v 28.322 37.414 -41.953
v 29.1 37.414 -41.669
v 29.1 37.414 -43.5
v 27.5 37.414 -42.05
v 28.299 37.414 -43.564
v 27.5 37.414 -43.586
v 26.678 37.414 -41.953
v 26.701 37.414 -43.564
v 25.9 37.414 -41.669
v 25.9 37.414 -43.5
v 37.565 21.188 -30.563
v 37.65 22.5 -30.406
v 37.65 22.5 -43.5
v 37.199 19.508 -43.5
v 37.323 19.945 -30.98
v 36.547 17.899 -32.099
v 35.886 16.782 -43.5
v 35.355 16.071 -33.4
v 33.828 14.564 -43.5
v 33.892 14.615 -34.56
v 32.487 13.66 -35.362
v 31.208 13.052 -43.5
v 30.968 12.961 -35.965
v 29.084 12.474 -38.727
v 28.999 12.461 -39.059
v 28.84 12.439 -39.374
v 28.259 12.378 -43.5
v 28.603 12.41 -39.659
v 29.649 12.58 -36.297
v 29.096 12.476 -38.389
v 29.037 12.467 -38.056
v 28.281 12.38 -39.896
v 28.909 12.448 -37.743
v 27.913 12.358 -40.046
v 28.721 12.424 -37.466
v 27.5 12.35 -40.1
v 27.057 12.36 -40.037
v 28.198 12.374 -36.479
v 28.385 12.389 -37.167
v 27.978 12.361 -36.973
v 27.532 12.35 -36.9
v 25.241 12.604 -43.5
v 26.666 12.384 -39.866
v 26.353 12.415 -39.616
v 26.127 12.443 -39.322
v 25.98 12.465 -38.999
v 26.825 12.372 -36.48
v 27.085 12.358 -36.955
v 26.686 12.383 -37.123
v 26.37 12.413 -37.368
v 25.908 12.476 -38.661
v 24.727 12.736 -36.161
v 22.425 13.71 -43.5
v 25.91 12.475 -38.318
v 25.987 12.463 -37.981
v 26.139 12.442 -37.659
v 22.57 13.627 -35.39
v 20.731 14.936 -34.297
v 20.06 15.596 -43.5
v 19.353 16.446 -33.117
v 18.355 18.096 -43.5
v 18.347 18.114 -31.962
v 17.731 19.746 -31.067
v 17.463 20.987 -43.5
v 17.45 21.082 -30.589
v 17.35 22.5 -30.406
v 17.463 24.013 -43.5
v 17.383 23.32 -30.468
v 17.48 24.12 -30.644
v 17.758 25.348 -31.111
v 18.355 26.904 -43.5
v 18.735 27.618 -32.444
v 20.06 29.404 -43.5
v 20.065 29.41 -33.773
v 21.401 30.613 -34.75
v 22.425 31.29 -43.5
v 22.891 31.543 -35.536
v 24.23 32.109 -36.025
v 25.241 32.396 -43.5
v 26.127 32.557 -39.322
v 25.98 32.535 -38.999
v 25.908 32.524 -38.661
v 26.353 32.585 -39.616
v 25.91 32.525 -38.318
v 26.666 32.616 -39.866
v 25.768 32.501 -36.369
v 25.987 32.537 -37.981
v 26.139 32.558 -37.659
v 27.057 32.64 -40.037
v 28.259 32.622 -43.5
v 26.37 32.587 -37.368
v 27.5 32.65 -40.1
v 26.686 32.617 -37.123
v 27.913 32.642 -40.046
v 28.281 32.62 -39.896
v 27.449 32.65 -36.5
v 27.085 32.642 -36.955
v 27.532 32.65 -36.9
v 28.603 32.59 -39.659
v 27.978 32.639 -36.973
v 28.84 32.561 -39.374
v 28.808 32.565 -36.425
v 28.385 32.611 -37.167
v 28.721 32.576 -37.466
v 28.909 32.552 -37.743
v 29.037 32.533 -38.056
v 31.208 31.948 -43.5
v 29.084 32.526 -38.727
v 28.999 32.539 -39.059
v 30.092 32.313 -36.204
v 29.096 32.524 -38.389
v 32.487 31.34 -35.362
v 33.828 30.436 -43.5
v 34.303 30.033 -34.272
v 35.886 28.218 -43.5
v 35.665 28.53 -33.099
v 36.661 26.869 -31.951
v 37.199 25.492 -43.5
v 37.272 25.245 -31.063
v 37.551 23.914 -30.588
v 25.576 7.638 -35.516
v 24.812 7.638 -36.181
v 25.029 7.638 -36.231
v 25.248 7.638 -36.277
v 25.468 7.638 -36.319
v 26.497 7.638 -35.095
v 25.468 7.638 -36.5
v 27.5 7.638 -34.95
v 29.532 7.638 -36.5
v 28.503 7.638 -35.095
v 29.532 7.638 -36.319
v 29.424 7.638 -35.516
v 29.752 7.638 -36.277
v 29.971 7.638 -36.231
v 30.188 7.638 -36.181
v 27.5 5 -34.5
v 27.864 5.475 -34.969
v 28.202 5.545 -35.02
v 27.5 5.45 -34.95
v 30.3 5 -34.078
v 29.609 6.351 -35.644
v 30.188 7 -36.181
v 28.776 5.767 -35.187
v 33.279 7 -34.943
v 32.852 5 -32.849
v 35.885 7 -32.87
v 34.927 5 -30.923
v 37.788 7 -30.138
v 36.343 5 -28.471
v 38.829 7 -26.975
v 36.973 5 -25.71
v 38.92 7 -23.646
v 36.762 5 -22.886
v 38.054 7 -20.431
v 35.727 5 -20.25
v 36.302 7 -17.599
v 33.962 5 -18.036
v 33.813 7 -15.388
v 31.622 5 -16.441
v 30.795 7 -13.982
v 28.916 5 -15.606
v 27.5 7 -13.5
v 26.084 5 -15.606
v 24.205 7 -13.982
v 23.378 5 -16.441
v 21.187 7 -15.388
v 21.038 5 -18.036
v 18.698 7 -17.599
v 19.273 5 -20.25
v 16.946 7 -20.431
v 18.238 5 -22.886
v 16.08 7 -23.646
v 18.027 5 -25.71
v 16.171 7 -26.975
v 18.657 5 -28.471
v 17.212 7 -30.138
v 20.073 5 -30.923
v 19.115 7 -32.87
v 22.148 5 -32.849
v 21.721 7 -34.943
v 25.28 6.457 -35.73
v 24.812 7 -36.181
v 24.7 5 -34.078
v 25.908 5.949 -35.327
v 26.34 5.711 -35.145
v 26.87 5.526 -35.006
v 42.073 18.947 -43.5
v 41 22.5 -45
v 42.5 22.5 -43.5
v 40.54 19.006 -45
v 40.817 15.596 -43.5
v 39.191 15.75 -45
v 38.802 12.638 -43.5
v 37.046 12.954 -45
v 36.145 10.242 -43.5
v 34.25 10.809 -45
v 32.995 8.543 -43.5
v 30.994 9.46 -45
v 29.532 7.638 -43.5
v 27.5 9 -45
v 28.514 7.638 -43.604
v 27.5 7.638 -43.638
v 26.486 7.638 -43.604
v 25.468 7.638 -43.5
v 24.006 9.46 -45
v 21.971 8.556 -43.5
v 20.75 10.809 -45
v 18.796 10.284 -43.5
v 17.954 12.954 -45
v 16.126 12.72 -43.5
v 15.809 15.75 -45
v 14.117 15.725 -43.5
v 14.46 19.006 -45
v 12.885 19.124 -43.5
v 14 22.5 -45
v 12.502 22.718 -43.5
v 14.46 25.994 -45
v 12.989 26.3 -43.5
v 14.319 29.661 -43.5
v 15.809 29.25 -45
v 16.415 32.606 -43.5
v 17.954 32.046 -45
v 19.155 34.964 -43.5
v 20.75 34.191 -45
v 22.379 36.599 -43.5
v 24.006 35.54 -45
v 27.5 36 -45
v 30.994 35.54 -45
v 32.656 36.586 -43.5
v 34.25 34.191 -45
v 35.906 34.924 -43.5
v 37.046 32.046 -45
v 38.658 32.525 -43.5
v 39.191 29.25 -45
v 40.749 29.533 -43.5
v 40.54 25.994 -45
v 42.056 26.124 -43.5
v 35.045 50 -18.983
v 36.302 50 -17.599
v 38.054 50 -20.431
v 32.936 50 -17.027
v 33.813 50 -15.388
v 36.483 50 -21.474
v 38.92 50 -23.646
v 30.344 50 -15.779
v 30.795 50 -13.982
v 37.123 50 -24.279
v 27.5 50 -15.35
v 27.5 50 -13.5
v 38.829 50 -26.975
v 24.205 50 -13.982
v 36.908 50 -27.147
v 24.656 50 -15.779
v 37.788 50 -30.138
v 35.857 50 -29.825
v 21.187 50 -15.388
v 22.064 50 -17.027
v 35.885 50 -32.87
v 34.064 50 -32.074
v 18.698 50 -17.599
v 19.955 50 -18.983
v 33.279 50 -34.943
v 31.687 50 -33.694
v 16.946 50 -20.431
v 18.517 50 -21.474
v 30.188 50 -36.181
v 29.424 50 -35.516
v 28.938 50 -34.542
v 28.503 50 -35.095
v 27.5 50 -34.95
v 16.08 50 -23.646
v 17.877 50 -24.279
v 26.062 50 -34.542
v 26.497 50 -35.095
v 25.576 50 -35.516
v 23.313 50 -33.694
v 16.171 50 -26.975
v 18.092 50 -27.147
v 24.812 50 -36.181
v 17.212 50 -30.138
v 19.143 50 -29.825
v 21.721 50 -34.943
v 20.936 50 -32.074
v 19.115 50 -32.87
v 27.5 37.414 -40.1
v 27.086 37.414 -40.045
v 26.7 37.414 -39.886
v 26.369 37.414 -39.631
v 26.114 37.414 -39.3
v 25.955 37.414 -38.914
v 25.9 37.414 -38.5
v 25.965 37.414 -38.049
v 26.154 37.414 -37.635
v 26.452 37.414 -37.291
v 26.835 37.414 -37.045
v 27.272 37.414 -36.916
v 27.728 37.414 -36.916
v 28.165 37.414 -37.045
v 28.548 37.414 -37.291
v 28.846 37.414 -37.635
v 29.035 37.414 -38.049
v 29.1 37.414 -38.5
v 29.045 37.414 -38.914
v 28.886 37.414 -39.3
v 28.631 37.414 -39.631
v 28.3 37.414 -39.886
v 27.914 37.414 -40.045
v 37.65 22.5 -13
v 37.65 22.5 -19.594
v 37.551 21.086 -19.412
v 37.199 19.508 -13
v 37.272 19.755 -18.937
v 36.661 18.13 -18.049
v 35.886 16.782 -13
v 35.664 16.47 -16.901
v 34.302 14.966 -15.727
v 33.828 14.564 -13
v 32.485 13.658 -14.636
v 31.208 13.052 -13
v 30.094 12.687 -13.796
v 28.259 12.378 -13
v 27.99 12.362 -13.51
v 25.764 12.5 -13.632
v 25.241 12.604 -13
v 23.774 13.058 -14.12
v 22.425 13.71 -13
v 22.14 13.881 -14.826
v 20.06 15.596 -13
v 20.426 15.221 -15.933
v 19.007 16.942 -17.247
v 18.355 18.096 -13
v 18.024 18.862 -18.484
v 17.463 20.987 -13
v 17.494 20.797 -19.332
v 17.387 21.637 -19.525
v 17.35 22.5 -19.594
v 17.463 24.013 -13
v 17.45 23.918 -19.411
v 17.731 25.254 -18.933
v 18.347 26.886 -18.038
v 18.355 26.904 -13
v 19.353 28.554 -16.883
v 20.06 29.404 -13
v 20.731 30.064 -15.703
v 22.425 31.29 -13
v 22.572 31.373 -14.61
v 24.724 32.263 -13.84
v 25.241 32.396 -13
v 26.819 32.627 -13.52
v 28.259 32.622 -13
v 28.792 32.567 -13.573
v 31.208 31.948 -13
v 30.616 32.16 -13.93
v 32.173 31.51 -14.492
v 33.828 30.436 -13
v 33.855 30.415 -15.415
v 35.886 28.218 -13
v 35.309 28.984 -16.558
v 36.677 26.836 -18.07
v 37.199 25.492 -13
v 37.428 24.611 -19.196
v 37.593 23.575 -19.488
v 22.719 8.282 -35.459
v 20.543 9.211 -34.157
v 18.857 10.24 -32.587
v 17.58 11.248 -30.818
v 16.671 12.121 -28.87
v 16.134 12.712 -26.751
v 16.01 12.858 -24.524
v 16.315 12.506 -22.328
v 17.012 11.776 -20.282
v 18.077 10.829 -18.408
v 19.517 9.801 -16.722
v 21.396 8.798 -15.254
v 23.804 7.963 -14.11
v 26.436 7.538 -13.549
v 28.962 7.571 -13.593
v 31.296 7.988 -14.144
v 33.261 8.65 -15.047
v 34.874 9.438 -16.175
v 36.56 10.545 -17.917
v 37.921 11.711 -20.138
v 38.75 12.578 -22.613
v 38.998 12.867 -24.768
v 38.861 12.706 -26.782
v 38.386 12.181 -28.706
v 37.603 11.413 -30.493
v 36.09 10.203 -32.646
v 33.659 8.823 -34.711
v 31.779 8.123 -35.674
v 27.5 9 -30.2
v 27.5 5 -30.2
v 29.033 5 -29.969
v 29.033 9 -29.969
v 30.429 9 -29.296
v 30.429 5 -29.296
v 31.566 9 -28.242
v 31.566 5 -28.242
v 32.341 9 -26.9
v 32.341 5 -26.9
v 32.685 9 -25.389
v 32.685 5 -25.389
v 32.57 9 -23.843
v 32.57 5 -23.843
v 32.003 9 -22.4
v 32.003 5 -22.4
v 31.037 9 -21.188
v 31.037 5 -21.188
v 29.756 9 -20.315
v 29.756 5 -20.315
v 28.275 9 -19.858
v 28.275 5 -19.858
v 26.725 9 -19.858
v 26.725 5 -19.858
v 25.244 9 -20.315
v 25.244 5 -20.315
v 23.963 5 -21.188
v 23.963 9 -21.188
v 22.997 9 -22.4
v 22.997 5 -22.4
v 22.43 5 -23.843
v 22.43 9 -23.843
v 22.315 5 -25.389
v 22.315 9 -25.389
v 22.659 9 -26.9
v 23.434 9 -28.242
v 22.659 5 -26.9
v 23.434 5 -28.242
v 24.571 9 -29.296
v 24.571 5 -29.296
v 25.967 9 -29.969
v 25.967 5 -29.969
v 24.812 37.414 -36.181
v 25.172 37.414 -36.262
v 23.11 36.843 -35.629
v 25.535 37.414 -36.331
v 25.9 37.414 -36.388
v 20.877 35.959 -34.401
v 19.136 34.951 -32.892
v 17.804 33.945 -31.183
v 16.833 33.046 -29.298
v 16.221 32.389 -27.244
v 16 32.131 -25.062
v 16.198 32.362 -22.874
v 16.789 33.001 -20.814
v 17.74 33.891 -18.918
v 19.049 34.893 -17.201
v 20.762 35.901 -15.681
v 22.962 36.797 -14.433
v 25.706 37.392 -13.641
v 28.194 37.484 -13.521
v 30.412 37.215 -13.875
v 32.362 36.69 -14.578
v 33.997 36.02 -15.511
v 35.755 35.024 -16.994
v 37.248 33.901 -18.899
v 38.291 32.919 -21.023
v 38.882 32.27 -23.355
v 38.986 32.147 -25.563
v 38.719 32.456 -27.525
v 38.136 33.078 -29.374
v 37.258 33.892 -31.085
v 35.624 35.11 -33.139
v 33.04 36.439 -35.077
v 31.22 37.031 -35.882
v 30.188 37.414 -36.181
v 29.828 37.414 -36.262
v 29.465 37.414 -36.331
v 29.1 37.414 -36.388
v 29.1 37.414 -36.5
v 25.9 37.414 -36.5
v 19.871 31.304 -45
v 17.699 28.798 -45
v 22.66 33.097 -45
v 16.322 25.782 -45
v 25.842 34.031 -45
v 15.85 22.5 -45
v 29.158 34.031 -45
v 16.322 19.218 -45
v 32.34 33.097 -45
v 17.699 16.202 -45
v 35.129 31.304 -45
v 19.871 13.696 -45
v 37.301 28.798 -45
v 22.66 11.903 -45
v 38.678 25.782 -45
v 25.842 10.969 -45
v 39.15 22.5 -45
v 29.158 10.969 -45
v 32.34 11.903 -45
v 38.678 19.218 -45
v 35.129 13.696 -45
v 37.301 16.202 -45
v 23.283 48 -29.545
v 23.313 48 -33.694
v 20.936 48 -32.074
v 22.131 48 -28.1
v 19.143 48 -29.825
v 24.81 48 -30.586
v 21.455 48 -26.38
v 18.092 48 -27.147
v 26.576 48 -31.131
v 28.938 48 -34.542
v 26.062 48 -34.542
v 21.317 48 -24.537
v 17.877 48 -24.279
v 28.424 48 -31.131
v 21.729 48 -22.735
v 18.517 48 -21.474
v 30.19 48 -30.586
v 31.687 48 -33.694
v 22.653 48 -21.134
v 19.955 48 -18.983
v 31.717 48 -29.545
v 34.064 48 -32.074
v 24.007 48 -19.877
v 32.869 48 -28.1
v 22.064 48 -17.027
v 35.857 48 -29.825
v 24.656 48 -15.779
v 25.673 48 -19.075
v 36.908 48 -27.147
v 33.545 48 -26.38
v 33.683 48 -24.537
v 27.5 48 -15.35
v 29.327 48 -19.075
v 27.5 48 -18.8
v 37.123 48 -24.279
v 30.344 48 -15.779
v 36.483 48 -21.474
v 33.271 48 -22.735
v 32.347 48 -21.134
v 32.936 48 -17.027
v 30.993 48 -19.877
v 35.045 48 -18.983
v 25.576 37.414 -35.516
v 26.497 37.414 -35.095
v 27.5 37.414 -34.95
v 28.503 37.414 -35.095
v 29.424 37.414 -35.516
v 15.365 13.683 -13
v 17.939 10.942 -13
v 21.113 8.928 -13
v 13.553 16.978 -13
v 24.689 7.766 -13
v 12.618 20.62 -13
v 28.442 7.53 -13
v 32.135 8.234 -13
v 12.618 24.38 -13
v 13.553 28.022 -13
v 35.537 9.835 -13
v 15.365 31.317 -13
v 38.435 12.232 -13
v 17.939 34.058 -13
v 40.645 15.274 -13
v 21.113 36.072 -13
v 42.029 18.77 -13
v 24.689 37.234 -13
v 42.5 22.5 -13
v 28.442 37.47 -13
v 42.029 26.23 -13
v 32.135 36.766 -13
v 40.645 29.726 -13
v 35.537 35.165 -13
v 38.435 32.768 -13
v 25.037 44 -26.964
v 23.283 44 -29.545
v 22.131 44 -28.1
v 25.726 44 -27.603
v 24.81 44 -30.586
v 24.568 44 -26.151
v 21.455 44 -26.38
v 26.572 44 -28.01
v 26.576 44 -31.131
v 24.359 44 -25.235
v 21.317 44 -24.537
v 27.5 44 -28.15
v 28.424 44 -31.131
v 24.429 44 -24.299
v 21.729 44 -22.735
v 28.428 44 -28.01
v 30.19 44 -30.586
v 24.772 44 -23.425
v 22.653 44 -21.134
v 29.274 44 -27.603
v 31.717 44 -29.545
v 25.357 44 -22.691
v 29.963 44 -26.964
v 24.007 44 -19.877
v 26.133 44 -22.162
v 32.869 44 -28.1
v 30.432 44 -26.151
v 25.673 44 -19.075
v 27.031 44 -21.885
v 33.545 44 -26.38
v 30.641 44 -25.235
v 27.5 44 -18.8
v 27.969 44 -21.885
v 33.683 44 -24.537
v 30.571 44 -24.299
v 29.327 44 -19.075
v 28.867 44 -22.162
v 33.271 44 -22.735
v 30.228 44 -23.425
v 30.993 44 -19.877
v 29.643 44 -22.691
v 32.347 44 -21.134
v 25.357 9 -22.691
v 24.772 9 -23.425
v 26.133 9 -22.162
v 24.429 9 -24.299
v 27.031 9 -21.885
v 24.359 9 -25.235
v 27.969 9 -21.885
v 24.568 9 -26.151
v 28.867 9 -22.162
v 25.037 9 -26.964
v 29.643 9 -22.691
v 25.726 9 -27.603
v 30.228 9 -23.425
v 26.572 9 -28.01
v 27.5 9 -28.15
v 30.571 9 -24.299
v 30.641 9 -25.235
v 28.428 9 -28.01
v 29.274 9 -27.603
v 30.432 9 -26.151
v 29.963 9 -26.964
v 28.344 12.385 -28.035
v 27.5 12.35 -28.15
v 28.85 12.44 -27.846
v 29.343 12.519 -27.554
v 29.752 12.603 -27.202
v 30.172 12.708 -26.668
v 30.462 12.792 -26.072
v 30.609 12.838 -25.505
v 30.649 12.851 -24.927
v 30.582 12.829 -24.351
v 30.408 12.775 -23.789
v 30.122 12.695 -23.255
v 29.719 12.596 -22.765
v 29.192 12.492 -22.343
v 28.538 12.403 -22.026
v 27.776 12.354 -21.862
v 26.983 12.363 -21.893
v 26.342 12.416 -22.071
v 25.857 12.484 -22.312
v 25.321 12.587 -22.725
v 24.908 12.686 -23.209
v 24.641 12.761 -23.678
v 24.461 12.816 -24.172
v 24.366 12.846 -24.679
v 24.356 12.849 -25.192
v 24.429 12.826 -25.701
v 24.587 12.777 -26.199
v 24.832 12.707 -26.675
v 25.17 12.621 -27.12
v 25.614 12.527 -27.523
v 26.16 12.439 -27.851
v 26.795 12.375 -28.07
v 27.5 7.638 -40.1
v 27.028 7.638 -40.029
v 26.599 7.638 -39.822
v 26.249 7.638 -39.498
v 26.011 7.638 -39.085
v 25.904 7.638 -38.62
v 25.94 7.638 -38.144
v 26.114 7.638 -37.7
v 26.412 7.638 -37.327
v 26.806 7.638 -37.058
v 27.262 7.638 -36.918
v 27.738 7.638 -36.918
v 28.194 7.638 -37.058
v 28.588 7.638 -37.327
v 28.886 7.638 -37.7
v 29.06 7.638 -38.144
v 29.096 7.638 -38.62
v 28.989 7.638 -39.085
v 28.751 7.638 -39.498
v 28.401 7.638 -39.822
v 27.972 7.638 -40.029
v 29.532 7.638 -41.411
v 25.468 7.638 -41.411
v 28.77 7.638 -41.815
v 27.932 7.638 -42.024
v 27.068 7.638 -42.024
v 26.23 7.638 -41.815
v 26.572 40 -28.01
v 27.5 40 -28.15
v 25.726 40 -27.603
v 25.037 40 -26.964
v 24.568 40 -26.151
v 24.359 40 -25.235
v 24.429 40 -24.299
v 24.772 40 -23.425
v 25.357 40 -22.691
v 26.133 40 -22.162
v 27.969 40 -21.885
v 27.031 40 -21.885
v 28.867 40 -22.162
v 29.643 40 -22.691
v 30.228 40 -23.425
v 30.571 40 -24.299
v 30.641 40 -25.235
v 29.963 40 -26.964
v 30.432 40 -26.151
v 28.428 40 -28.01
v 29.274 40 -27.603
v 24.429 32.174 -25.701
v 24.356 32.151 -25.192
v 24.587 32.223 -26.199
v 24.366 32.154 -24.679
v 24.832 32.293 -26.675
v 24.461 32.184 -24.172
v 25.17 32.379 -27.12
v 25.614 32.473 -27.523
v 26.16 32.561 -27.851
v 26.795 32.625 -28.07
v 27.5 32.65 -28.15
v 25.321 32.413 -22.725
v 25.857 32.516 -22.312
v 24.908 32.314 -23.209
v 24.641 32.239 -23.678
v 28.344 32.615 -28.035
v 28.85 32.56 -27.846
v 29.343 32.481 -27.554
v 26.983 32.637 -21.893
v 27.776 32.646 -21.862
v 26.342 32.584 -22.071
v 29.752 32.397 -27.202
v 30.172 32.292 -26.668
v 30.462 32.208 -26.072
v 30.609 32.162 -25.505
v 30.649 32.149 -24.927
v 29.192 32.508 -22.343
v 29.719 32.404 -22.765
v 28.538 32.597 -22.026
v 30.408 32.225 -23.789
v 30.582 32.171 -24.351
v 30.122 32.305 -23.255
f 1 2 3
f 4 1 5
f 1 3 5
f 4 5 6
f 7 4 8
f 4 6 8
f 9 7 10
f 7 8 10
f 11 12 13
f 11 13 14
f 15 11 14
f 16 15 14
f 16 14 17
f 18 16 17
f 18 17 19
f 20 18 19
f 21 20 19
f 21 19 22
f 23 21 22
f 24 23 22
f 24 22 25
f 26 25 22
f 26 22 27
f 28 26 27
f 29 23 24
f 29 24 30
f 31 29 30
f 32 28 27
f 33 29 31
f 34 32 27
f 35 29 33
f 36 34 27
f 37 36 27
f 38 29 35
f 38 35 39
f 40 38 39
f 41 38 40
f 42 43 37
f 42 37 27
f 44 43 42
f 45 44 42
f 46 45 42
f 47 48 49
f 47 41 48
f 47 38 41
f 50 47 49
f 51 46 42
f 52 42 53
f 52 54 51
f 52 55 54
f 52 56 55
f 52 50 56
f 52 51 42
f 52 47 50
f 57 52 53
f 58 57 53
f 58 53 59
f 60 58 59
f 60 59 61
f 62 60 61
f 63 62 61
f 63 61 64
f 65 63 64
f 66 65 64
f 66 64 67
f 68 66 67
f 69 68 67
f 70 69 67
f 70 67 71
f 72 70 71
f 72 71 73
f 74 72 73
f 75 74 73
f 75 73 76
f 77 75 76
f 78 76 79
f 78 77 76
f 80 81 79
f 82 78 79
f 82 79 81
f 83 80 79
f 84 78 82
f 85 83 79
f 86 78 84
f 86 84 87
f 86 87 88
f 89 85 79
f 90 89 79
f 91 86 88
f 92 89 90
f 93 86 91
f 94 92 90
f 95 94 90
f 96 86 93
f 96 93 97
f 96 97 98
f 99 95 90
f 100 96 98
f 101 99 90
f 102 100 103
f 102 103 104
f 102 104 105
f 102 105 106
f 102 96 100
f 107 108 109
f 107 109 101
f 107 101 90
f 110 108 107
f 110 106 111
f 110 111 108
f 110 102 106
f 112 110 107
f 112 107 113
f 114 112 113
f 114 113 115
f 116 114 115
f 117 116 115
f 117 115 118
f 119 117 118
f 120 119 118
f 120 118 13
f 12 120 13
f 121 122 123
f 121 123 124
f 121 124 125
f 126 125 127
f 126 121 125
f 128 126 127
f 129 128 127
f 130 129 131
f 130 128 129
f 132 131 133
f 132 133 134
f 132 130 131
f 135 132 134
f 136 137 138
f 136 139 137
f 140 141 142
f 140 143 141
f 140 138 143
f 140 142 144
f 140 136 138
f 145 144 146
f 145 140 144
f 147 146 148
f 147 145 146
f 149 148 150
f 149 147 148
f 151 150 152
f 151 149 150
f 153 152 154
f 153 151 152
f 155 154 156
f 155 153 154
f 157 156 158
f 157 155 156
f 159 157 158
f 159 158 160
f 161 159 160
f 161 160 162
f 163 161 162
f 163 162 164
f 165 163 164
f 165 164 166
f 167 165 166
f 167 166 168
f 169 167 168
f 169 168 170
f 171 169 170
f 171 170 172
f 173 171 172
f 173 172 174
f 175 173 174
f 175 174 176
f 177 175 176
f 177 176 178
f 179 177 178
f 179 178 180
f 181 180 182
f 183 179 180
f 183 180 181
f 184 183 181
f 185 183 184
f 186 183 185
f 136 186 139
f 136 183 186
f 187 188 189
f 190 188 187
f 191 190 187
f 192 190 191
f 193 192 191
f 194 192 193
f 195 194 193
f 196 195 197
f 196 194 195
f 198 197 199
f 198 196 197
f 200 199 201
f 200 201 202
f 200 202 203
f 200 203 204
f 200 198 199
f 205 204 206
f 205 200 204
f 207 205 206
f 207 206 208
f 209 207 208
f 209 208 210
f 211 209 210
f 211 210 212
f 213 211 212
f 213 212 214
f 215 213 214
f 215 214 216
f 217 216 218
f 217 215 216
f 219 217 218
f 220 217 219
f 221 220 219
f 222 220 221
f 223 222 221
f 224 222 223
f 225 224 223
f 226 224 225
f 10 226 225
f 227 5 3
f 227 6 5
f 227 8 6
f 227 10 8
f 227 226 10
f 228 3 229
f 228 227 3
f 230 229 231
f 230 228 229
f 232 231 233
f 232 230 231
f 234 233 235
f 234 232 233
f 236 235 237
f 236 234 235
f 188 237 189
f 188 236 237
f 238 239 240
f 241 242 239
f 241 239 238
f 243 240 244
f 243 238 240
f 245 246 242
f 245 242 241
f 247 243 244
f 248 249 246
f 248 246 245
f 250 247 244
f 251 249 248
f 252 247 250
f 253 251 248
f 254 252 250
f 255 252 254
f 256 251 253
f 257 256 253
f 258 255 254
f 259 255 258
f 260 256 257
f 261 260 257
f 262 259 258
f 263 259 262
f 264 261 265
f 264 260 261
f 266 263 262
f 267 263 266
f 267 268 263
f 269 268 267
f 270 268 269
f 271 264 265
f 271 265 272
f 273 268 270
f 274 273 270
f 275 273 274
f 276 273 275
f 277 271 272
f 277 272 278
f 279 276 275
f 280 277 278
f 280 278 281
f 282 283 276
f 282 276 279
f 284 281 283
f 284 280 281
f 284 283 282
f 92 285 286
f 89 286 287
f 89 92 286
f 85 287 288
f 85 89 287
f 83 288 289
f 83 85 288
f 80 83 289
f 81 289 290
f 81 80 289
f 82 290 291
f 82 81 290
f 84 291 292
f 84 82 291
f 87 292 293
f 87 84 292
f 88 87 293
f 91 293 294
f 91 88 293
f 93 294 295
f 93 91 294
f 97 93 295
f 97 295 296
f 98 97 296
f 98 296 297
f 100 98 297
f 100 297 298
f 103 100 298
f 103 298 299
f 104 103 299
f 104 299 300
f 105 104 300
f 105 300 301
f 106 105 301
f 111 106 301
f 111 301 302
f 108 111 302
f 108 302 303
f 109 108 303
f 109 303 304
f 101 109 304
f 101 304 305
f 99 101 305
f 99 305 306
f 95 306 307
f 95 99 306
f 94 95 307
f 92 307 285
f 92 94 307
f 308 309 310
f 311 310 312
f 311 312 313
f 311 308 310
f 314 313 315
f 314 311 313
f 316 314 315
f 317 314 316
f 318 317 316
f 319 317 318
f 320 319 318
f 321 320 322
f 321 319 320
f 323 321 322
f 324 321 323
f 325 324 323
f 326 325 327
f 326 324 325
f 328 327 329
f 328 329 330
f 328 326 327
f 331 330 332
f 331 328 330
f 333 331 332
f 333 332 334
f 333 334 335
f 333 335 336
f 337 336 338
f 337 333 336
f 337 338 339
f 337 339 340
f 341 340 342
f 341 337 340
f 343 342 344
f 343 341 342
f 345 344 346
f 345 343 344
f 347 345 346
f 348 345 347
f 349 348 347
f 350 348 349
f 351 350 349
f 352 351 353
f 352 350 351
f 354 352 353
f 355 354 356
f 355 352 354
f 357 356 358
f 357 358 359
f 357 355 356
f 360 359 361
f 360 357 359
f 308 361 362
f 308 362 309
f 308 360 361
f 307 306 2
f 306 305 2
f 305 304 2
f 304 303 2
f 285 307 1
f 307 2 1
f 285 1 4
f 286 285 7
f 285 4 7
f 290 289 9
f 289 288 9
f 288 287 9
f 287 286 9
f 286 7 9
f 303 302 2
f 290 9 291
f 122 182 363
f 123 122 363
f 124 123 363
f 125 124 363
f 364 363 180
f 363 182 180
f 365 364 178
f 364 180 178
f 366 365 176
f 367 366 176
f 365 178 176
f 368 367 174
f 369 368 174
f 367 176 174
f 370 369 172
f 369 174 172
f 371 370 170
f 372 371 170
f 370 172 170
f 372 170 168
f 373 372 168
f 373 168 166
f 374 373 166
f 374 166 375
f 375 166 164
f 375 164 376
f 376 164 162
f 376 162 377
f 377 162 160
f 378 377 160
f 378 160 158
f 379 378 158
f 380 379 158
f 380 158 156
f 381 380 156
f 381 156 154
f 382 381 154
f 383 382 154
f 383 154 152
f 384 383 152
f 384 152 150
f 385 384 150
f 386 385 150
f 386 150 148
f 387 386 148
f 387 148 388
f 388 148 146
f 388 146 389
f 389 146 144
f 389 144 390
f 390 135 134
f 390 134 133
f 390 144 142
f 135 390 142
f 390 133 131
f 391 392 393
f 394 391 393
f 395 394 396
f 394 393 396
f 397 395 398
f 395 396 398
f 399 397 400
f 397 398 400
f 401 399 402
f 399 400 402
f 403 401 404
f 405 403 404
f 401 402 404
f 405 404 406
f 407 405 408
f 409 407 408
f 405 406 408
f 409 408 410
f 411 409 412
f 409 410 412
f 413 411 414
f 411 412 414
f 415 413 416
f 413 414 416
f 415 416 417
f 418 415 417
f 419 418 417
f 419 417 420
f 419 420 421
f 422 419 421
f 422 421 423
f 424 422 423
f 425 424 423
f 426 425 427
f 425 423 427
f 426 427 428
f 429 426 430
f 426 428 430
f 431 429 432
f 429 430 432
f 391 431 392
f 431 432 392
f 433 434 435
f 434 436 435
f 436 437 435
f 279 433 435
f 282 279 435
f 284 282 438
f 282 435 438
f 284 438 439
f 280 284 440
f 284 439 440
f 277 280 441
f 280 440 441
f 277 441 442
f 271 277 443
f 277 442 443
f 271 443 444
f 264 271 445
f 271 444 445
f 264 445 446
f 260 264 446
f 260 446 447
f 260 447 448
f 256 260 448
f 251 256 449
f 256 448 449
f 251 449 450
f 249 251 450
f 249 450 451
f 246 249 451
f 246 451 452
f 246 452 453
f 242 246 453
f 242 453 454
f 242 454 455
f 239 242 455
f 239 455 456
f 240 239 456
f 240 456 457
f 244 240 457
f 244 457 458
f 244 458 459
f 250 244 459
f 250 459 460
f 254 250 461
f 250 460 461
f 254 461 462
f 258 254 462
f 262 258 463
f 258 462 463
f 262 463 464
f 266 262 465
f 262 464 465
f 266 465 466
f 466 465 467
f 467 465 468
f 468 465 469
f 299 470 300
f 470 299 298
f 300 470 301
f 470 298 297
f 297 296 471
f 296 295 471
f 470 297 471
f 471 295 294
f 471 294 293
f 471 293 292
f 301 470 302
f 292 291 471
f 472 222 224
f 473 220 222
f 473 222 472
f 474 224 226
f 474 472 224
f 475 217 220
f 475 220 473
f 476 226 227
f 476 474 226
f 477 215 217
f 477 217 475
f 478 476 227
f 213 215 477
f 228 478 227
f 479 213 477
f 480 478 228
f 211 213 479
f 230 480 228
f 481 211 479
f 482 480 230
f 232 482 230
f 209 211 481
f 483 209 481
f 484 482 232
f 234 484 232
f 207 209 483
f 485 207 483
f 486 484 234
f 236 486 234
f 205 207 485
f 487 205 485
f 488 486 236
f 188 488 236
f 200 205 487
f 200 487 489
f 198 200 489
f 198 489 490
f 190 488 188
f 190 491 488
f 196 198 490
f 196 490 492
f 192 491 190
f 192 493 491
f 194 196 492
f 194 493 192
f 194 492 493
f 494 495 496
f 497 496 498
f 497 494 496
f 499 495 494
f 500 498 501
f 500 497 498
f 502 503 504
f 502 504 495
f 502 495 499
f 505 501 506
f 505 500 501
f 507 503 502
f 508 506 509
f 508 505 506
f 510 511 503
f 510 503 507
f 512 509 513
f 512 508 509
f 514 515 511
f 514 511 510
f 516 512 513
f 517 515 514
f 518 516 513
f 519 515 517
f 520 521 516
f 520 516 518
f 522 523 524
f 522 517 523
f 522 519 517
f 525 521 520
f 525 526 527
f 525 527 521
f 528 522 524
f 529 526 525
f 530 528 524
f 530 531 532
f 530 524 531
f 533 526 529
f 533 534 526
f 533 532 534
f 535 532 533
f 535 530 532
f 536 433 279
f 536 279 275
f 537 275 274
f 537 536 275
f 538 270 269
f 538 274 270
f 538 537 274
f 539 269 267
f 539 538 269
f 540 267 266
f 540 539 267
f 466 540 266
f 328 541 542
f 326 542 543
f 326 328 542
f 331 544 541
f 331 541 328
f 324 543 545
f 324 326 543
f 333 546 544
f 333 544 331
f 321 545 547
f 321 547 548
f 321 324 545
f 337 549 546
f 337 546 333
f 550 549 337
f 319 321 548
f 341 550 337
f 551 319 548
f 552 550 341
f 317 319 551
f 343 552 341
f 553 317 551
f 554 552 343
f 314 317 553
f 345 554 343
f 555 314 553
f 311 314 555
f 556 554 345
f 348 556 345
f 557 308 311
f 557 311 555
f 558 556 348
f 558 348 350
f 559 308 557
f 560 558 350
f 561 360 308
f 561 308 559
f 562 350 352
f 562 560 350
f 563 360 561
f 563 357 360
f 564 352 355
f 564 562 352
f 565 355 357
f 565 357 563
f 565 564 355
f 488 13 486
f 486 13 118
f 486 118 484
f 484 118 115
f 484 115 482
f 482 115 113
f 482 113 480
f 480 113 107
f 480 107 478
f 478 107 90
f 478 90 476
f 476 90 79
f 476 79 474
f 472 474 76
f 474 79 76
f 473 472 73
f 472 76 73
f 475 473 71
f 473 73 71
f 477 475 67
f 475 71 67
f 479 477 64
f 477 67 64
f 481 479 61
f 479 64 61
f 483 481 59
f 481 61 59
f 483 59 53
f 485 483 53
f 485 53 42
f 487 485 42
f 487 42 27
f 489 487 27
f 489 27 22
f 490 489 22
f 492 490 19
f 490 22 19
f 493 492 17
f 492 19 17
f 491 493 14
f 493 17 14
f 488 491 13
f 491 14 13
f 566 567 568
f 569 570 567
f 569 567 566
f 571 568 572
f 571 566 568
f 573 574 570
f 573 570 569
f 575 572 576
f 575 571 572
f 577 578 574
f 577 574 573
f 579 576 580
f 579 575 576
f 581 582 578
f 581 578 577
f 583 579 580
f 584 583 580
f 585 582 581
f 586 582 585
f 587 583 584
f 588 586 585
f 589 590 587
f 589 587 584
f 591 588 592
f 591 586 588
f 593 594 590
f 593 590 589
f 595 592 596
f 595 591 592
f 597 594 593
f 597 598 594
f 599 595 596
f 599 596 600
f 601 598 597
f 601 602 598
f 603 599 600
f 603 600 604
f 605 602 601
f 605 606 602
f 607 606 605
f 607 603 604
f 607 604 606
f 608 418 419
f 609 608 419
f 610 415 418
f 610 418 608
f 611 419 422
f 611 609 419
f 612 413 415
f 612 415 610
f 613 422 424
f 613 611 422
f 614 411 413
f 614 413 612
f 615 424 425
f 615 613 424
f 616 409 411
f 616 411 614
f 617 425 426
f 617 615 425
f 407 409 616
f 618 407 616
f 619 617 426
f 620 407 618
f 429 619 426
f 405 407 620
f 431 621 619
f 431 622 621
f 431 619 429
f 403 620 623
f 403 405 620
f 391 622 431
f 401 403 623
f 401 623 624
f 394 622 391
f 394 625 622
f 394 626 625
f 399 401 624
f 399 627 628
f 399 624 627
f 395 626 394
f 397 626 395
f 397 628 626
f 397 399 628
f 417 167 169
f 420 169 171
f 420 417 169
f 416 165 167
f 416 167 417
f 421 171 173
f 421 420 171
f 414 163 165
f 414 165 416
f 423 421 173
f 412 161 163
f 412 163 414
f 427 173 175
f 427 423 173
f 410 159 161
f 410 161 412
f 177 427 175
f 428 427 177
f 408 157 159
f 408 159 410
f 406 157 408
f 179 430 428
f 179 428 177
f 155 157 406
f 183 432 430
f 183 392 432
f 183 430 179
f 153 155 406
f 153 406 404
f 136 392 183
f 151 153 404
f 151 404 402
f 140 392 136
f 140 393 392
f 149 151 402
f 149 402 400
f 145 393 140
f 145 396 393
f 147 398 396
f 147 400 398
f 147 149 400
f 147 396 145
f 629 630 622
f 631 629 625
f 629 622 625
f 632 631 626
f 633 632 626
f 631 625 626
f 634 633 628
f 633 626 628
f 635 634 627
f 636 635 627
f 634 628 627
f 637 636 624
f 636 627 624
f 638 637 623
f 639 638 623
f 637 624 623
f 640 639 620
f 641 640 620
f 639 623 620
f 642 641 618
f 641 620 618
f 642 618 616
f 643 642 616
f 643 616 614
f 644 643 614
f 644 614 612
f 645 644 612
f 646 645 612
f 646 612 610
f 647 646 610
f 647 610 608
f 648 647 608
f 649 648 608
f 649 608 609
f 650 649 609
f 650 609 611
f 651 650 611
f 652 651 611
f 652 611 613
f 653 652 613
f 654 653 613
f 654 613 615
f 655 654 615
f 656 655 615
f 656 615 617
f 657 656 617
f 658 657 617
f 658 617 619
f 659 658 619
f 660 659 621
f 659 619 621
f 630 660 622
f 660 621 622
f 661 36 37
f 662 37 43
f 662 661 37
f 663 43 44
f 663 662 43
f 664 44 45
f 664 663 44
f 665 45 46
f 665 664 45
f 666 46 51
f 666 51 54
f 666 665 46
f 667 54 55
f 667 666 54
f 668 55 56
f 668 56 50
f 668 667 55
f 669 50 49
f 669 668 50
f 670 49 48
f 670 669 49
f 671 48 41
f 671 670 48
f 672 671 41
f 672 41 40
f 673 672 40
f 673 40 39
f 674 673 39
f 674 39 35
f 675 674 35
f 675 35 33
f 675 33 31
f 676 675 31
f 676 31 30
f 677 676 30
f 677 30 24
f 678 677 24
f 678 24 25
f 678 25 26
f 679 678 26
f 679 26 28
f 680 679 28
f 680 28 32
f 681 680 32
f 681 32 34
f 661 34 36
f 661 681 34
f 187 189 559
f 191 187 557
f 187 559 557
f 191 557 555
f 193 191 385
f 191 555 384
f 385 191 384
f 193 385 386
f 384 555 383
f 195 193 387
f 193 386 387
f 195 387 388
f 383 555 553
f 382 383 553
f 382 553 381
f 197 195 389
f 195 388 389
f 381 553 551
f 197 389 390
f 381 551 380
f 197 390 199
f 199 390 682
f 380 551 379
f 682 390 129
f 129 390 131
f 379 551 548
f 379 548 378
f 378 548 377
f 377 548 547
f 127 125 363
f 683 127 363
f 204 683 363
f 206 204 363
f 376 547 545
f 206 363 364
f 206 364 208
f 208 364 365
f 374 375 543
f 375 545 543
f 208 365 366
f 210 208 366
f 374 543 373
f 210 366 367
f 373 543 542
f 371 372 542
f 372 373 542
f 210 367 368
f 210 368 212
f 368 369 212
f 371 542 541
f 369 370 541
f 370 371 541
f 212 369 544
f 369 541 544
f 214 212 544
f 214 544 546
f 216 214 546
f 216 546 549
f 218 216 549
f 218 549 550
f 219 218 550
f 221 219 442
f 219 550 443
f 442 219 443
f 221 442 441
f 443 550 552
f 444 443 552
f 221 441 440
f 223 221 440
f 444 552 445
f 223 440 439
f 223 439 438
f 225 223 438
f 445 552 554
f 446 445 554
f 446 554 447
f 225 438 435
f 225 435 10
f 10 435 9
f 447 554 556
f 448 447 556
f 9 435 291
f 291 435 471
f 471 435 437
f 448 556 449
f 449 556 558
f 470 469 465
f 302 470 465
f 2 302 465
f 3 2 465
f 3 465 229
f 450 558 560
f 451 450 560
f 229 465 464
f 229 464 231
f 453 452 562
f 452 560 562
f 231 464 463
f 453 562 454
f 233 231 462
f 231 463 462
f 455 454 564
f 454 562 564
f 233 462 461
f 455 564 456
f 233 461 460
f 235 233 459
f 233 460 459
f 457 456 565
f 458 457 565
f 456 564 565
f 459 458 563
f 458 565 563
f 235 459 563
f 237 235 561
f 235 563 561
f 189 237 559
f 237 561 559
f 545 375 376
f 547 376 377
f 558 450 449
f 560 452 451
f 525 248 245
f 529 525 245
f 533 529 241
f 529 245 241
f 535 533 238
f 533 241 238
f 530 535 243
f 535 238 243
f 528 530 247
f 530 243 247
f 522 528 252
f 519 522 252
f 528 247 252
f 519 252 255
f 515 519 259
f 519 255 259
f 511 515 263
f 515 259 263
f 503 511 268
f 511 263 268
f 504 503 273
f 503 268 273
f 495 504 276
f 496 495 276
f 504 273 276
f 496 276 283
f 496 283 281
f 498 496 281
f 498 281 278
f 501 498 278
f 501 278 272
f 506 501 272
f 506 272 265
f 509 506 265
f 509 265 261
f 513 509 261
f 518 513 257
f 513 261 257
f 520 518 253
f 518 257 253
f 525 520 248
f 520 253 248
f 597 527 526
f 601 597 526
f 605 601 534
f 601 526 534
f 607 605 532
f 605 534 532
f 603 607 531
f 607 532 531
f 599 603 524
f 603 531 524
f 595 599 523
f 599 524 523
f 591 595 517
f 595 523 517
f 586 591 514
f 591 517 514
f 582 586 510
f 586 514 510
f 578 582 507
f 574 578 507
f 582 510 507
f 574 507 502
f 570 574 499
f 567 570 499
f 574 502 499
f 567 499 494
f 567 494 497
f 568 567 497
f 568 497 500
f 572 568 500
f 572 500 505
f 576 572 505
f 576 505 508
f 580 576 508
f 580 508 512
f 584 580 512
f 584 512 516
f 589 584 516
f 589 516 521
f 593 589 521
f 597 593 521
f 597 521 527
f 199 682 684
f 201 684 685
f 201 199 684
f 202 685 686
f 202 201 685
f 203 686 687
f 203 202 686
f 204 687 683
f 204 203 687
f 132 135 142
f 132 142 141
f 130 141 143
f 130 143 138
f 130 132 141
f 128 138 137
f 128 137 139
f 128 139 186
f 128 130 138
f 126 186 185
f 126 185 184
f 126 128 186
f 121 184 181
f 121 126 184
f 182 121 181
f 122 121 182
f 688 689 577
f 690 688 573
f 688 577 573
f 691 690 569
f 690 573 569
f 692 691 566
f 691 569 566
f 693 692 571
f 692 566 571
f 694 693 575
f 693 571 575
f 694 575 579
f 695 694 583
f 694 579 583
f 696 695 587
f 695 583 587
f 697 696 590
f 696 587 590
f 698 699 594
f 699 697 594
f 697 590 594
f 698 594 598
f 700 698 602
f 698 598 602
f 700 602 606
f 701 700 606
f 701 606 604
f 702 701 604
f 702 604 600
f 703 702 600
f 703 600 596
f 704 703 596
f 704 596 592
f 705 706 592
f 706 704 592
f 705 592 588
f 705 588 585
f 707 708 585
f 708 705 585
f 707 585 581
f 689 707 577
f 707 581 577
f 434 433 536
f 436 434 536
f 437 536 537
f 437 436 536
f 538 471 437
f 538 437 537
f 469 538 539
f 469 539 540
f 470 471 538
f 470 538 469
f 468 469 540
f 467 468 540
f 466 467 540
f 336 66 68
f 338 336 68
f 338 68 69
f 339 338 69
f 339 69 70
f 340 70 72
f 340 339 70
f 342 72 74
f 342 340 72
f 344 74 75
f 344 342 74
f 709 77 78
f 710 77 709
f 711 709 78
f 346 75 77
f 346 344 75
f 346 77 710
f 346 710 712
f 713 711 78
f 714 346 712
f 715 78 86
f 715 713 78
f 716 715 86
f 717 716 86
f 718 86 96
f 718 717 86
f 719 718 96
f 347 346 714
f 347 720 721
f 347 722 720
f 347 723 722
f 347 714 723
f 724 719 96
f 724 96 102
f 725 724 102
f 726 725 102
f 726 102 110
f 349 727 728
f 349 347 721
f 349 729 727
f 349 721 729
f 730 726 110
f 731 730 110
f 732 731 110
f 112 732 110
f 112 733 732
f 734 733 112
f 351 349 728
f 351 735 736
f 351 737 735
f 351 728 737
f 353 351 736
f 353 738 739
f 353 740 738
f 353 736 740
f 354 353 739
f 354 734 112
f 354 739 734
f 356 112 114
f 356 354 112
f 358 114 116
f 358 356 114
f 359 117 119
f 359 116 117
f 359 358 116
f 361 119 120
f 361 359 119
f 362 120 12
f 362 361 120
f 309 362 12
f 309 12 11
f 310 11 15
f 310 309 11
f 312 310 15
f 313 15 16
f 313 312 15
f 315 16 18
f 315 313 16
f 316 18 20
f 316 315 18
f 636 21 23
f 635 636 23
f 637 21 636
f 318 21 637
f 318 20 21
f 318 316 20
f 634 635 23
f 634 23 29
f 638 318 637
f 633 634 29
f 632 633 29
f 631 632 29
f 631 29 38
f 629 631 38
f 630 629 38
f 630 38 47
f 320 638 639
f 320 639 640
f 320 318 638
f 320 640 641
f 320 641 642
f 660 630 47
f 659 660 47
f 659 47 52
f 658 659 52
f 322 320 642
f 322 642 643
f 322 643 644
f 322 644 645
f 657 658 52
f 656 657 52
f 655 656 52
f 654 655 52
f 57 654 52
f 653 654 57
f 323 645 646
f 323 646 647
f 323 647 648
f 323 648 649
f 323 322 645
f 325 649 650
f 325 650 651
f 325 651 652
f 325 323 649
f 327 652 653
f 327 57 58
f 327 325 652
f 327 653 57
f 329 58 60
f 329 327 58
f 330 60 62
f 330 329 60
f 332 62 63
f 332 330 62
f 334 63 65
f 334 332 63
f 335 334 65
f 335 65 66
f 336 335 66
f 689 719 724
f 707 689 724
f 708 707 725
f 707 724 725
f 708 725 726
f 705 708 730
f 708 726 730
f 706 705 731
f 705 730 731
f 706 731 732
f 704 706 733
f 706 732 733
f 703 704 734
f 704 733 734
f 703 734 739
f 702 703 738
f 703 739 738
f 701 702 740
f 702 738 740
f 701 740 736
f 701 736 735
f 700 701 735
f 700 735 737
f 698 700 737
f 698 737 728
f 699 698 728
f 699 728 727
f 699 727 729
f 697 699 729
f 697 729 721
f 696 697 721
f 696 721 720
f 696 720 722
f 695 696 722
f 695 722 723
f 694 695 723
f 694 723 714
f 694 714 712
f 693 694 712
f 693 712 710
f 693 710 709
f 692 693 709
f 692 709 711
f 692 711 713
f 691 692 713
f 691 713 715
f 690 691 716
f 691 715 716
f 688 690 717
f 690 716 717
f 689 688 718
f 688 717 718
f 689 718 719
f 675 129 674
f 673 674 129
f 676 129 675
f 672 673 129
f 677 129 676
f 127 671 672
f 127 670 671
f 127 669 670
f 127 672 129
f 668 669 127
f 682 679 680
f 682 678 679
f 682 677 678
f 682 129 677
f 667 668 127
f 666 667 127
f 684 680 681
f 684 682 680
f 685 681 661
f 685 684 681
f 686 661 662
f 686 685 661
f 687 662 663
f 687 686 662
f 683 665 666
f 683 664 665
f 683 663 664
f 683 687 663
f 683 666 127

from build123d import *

# Parameters (mm, degrees)
EXTRUDE_1_DEPTH      = 45
SKETCH_5_R           = 7.9
EXTRUDE_3_DEPTH      = 45
CHAMFER_5_SIZE       = 8
CHAMFER_6_SIZE       = 2
FILLET_5_R           = 3
FILLET_6_R           = 2
SKETCH_7_R           = 15
SKETCH_7_R_2         = 10.15
EXTRUDE_4_DEPTH      = 45
SKETCH_6_R           = 1.6
SKETCH_6_R_2         = 3.1
CUT_EXTRUDE_4_DEPTH  = 85.113019206
SKETCH_10_R          = 11.5
EXTRUDE_5_DEPTH      = 50
FILLET_9_R           = 5
CUT_EXTRUDE_START    = -40
SKETCH_11_R          = 10.15
SKETCH_11_R_2        = 7.9
CUT_EXTRUDE_6_DEPTH  = 40
SKETCH_12_R          = 3.15
CUT_EXTRUDE_7_DEPTH  = 40
CHAMFER_9_SIZE       = 1.5
SKETCH_13_R          = 6.2
CUT_EXTRUDE_8_DEPTH  = 6
SKETCH_19_R          = 36.592880448
CUT_EXTRUDE_12_DEPTH = 87.890736042
SKETCH_20_R          = 20
CUT_EXTRUDE_13_DEPTH = 13
SKETCH_21_R          = 7.9
CUT_EXTRUDE_14_DEPTH = 74.008561269
SKETCH_22_W          = 4.064984698
SKETCH_22_H          = 0.276677518
SKETCH_22_W_2        = 3.2
SKETCH_22_H_2        = 0.1711549
CUT_EXTRUDE_15_DEPTH = 8.5
SKETCH_15_R          = 11.5
CUT_EXTRUDE_16_DEPTH = 5
SKETCH_23_R          = 5.2
CUT_EXTRUDE_17_DEPTH = 4
CHAMFER_10_SIZE      = 2
SKETCH_24_R          = 3.15
CUT_EXTRUDE_18_DEPTH = 74.159073316
SKETCH_25_R          = 9.65
CUT_EXTRUDE_19_DEPTH = 2
SKETCH_26_R          = 3.55
CUT_EXTRUDE_20_DEPTH = 14
SKETCH_27_R          = 3.55
CUT_EXTRUDE_21_DEPTH = 5


with BuildPart() as part:
    # 草图1 → 凸台-拉伸1 (new body)
    with BuildSketch(Plane(origin=(0, 0, 0), x_dir=(1, 0, 0), z_dir=(0, 1, 0))):
        with BuildLine():
            Line((0, 0), (55, 0))
            Line((55, 0), (55, -7))
            ThreePointArc((55, -7), (27.5, -34.5), (0, -7))
            Line((0, -7), (0, 0))
        make_face()
    extrude(amount=EXTRUDE_1_DEPTH)

    # 草图5 → 凸台-拉伸3 (add)
    with BuildSketch(Plane(origin=(0, 0, 0), x_dir=(-1, 0, 0), z_dir=(0, 0, -1))):
        with Locations((-27.5, 22.5)):
            Circle(SKETCH_5_R)
    extrude(amount=EXTRUDE_3_DEPTH)

    # 倒角5
    chamfer_5_edges = [part.edges().sort_by_distance(p)[0] for p in [
        (0, 45, 3.5),
        (55, 45, 3.5),
        (27.5, 45, 34.5),
        (0, 0, 3.5),
        (55, 0, 3.5),
        (27.5, 0, 34.5),
    ]]
    chamfer(chamfer_5_edges, length=CHAMFER_5_SIZE)

    # 倒角6
    chamfer_6_edges = [part.edges().sort_by_distance(p)[0] for p in [
        (4, 4, 0),
        (27.5, 0, 0),
        (51, 4, 0),
        (55, 22.5, 0),
        (51, 41, 0),
        (27.5, 45, 0),
        (4, 41, 0),
        (0, 22.5, 0),
    ]]
    chamfer(chamfer_6_edges, length=CHAMFER_6_SIZE)

    # 圆角5
    fillet_5_edges = [part.edges().sort_by_distance(p)[0] for p in [
        (35.4, 22.5, -45),
    ]]
    fillet(fillet_5_edges, radius=FILLET_5_R)

    # 圆角6
    fillet_6_edges = [part.edges().sort_by_distance(p)[0] for p in [
        (35.4, 22.5, 0),
    ]]
    fillet(fillet_6_edges, radius=FILLET_6_R)

    # 草图7 → 凸台-拉伸4 (add)
    with BuildSketch(Plane(origin=(0, 0, 0), x_dir=(-1, 0, 0), z_dir=(0, 0, -1))):
        with Locations((-27.5, 22.5)):
            Circle(SKETCH_7_R)
        with Locations((-27.5, 22.5)):
            Circle(SKETCH_7_R_2, mode=Mode.SUBTRACT)
    extrude(amount=EXTRUDE_4_DEPTH)

    # 草图6 → 切除-拉伸4 (cut, through all)
    with BuildSketch(Plane(origin=(0, 0, 0), x_dir=(1, 0, 0), z_dir=(0, 1, 0))):
        with Locations((27.5, 8.5)):
            Circle(SKETCH_6_R)
        with Locations((27.5, 25)):
            Circle(SKETCH_6_R_2)
        with Locations((27.5, 38.5)):
            Circle(SKETCH_6_R)
    extrude(amount=CUT_EXTRUDE_4_DEPTH, mode=Mode.SUBTRACT)

    # 草图10 → 凸台-拉伸5 (add)
    with BuildSketch(Plane(origin=(0, 0, 0), x_dir=(1, 0, 0), z_dir=(0, 1, 0))):
        with Locations((27.5, 25)):
            Circle(SKETCH_10_R)
    extrude(amount=EXTRUDE_5_DEPTH)

    # 圆角9
    fillet_9_edges = [part.edges().sort_by_distance(p)[0] for p in [
        (42.5, 22.5, 0),
    ]]
    fillet(fillet_9_edges, radius=FILLET_9_R)

    # 草图11 → 切除-拉伸6 (cut)
    with BuildSketch(Plane(origin=(0, 0, -45), x_dir=(-1, 0, 0), z_dir=(0, 0, -1)).offset(CUT_EXTRUDE_START)):
        with Locations((-27.5, 22.5)):
            Circle(SKETCH_11_R)
        with Locations((-27.5, 22.5)):
            Circle(SKETCH_11_R_2, mode=Mode.SUBTRACT)
    extrude(amount=CUT_EXTRUDE_6_DEPTH, mode=Mode.SUBTRACT)

    # 草图12 → 切除-拉伸7 (cut)
    with BuildSketch(Plane.XZ):
        with Locations((27.5, -25)):
            Circle(SKETCH_12_R)
    extrude(amount=-CUT_EXTRUDE_7_DEPTH, mode=Mode.SUBTRACT)

    # 倒角9
    chamfer_9_edges = [part.edges().sort_by_distance(p)[0] for p in [
        (37.65, 22.5, -45),
        (42.5, 22.5, -45),
    ]]
    chamfer(chamfer_9_edges, length=CHAMFER_9_SIZE)

    # 草图13 → 切除-拉伸8 (cut)
    with BuildSketch(Plane(origin=(0, 50, 0), x_dir=(1, 0, 0), z_dir=(0, 1, 0))):
        with Locations((27.5, 25)):
            Circle(SKETCH_13_R)
    extrude(amount=-CUT_EXTRUDE_8_DEPTH, mode=Mode.SUBTRACT)

    # 草图19 → 切除-拉伸12 (cut, through all)
    with BuildSketch(Plane(origin=(0, 0, 0), x_dir=(-1, 0, 0), z_dir=(0, 0, -1))):
        with Locations((-27.5, 22.5)):
            Circle(SKETCH_19_R)
    extrude(amount=-CUT_EXTRUDE_12_DEPTH, mode=Mode.SUBTRACT)


with BuildPart() as cut_extrude_12_piece_1:
    # of the separate pieces the step leaves, piece 1, a body of its own (cut_extrude_12_pieces)
    add(part.part.solids().sort_by_distance((12.5, 22.5, -43.5))[0])


with BuildPart() as cut_extrude_12_piece_2:
    # of the separate pieces the step leaves, piece 2, a body of its own (cut_extrude_12_pieces)
    add(part.part.solids().sort_by_distance((19.6, 22.5, -2))[0])


with BuildPart() as cut_extrude_13_tool:
    # 草图20 → 切除-拉伸13 (new body)
    with BuildSketch(Plane.XY):
        with Locations((27.5, 22.5)):
            Circle(SKETCH_20_R)
    extrude(amount=-CUT_EXTRUDE_13_DEPTH)


with BuildPart() as cut_extrude_12_piece_1_1:
    add(cut_extrude_12_piece_1.part)

    # 切除-拉伸13: cut by cut_extrude_13_tool
    add(cut_extrude_13_tool.part, mode=Mode.SUBTRACT)

    # 草图22 → 切除-拉伸15 (cut)
    with BuildSketch(Plane(origin=(0, 0, -45), x_dir=(-1, 0, 0), z_dir=(0, 0, -1))):
        with Locations((-27.5, 7.5)):
            Rectangle(SKETCH_22_W, SKETCH_22_H)
        with Locations((-27.5, 37.5)):
            Rectangle(SKETCH_22_W_2, SKETCH_22_H_2)
    extrude(amount=-CUT_EXTRUDE_15_DEPTH, mode=Mode.SUBTRACT)

    # 草图15 → 切除-拉伸16 (cut)
    with BuildSketch(Plane.XZ):
        with Locations((27.5, -25)):
            Circle(SKETCH_15_R)
    extrude(amount=-CUT_EXTRUDE_16_DEPTH, mode=Mode.SUBTRACT)

    # 草图23 → 切除-拉伸17 (cut)
    with BuildSketch(Plane.XZ.offset(-5)):
        with Locations((27.5, -25)):
            Circle(SKETCH_23_R)
    extrude(amount=-CUT_EXTRUDE_17_DEPTH, mode=Mode.SUBTRACT)

    # 倒角10
    chamfer_10_edges = [cut_extrude_12_piece_1_1.edges().sort_by_distance(p)[0] for p in [
        (16, 5, -25),
    ]]
    chamfer(chamfer_10_edges, length=CHAMFER_10_SIZE)

    # 草图24 → 切除-拉伸18 (cut, through all)
    with BuildSketch(Plane(origin=(0, 44, 0), x_dir=(1, 0, 0), z_dir=(0, 1, 0))):
        with Locations((27.5, 25)):
            Circle(SKETCH_24_R)
    extrude(amount=-CUT_EXTRUDE_18_DEPTH, mode=Mode.SUBTRACT)

    # 草图25 → 切除-拉伸19 (cut)
    with BuildSketch(Plane(origin=(0, 50, 0), x_dir=(1, 0, 0), z_dir=(0, 1, 0))):
        with Locations((27.5, 25)):
            Circle(SKETCH_25_R)
    extrude(amount=-CUT_EXTRUDE_19_DEPTH, mode=Mode.SUBTRACT)

    # 草图26 → 切除-拉伸20 (cut)
    with BuildSketch(Plane(origin=(0, 37.41442255, 0), x_dir=(1, 0, 0), z_dir=(0, 1, 0))):
        with Locations((27.5, 38.5)):
            Circle(SKETCH_26_R)
    extrude(amount=CUT_EXTRUDE_20_DEPTH, mode=Mode.SUBTRACT)

    # 草图27 → 切除-拉伸21 (cut)
    with BuildSketch(Plane.XZ.offset(-7.638338759)):
        with Locations((27.5, -38.5)):
            Circle(SKETCH_27_R)
    extrude(amount=CUT_EXTRUDE_21_DEPTH, mode=Mode.SUBTRACT)


with BuildPart() as cut_extrude_12_piece_2_1:
    add(cut_extrude_12_piece_2.part)

    # 切除-拉伸13: cut by cut_extrude_13_tool
    add(cut_extrude_13_tool.part, mode=Mode.SUBTRACT)

    # 草图21 → 切除-拉伸14 (cut, through all)
    with BuildSketch(Plane.XY.offset(-13)):
        with Locations((27.5, 22.5)):
            Circle(SKETCH_21_R)
    extrude(amount=-CUT_EXTRUDE_14_DEPTH, mode=Mode.SUBTRACT)


solid = cut_extrude_12_piece_1_1.part
